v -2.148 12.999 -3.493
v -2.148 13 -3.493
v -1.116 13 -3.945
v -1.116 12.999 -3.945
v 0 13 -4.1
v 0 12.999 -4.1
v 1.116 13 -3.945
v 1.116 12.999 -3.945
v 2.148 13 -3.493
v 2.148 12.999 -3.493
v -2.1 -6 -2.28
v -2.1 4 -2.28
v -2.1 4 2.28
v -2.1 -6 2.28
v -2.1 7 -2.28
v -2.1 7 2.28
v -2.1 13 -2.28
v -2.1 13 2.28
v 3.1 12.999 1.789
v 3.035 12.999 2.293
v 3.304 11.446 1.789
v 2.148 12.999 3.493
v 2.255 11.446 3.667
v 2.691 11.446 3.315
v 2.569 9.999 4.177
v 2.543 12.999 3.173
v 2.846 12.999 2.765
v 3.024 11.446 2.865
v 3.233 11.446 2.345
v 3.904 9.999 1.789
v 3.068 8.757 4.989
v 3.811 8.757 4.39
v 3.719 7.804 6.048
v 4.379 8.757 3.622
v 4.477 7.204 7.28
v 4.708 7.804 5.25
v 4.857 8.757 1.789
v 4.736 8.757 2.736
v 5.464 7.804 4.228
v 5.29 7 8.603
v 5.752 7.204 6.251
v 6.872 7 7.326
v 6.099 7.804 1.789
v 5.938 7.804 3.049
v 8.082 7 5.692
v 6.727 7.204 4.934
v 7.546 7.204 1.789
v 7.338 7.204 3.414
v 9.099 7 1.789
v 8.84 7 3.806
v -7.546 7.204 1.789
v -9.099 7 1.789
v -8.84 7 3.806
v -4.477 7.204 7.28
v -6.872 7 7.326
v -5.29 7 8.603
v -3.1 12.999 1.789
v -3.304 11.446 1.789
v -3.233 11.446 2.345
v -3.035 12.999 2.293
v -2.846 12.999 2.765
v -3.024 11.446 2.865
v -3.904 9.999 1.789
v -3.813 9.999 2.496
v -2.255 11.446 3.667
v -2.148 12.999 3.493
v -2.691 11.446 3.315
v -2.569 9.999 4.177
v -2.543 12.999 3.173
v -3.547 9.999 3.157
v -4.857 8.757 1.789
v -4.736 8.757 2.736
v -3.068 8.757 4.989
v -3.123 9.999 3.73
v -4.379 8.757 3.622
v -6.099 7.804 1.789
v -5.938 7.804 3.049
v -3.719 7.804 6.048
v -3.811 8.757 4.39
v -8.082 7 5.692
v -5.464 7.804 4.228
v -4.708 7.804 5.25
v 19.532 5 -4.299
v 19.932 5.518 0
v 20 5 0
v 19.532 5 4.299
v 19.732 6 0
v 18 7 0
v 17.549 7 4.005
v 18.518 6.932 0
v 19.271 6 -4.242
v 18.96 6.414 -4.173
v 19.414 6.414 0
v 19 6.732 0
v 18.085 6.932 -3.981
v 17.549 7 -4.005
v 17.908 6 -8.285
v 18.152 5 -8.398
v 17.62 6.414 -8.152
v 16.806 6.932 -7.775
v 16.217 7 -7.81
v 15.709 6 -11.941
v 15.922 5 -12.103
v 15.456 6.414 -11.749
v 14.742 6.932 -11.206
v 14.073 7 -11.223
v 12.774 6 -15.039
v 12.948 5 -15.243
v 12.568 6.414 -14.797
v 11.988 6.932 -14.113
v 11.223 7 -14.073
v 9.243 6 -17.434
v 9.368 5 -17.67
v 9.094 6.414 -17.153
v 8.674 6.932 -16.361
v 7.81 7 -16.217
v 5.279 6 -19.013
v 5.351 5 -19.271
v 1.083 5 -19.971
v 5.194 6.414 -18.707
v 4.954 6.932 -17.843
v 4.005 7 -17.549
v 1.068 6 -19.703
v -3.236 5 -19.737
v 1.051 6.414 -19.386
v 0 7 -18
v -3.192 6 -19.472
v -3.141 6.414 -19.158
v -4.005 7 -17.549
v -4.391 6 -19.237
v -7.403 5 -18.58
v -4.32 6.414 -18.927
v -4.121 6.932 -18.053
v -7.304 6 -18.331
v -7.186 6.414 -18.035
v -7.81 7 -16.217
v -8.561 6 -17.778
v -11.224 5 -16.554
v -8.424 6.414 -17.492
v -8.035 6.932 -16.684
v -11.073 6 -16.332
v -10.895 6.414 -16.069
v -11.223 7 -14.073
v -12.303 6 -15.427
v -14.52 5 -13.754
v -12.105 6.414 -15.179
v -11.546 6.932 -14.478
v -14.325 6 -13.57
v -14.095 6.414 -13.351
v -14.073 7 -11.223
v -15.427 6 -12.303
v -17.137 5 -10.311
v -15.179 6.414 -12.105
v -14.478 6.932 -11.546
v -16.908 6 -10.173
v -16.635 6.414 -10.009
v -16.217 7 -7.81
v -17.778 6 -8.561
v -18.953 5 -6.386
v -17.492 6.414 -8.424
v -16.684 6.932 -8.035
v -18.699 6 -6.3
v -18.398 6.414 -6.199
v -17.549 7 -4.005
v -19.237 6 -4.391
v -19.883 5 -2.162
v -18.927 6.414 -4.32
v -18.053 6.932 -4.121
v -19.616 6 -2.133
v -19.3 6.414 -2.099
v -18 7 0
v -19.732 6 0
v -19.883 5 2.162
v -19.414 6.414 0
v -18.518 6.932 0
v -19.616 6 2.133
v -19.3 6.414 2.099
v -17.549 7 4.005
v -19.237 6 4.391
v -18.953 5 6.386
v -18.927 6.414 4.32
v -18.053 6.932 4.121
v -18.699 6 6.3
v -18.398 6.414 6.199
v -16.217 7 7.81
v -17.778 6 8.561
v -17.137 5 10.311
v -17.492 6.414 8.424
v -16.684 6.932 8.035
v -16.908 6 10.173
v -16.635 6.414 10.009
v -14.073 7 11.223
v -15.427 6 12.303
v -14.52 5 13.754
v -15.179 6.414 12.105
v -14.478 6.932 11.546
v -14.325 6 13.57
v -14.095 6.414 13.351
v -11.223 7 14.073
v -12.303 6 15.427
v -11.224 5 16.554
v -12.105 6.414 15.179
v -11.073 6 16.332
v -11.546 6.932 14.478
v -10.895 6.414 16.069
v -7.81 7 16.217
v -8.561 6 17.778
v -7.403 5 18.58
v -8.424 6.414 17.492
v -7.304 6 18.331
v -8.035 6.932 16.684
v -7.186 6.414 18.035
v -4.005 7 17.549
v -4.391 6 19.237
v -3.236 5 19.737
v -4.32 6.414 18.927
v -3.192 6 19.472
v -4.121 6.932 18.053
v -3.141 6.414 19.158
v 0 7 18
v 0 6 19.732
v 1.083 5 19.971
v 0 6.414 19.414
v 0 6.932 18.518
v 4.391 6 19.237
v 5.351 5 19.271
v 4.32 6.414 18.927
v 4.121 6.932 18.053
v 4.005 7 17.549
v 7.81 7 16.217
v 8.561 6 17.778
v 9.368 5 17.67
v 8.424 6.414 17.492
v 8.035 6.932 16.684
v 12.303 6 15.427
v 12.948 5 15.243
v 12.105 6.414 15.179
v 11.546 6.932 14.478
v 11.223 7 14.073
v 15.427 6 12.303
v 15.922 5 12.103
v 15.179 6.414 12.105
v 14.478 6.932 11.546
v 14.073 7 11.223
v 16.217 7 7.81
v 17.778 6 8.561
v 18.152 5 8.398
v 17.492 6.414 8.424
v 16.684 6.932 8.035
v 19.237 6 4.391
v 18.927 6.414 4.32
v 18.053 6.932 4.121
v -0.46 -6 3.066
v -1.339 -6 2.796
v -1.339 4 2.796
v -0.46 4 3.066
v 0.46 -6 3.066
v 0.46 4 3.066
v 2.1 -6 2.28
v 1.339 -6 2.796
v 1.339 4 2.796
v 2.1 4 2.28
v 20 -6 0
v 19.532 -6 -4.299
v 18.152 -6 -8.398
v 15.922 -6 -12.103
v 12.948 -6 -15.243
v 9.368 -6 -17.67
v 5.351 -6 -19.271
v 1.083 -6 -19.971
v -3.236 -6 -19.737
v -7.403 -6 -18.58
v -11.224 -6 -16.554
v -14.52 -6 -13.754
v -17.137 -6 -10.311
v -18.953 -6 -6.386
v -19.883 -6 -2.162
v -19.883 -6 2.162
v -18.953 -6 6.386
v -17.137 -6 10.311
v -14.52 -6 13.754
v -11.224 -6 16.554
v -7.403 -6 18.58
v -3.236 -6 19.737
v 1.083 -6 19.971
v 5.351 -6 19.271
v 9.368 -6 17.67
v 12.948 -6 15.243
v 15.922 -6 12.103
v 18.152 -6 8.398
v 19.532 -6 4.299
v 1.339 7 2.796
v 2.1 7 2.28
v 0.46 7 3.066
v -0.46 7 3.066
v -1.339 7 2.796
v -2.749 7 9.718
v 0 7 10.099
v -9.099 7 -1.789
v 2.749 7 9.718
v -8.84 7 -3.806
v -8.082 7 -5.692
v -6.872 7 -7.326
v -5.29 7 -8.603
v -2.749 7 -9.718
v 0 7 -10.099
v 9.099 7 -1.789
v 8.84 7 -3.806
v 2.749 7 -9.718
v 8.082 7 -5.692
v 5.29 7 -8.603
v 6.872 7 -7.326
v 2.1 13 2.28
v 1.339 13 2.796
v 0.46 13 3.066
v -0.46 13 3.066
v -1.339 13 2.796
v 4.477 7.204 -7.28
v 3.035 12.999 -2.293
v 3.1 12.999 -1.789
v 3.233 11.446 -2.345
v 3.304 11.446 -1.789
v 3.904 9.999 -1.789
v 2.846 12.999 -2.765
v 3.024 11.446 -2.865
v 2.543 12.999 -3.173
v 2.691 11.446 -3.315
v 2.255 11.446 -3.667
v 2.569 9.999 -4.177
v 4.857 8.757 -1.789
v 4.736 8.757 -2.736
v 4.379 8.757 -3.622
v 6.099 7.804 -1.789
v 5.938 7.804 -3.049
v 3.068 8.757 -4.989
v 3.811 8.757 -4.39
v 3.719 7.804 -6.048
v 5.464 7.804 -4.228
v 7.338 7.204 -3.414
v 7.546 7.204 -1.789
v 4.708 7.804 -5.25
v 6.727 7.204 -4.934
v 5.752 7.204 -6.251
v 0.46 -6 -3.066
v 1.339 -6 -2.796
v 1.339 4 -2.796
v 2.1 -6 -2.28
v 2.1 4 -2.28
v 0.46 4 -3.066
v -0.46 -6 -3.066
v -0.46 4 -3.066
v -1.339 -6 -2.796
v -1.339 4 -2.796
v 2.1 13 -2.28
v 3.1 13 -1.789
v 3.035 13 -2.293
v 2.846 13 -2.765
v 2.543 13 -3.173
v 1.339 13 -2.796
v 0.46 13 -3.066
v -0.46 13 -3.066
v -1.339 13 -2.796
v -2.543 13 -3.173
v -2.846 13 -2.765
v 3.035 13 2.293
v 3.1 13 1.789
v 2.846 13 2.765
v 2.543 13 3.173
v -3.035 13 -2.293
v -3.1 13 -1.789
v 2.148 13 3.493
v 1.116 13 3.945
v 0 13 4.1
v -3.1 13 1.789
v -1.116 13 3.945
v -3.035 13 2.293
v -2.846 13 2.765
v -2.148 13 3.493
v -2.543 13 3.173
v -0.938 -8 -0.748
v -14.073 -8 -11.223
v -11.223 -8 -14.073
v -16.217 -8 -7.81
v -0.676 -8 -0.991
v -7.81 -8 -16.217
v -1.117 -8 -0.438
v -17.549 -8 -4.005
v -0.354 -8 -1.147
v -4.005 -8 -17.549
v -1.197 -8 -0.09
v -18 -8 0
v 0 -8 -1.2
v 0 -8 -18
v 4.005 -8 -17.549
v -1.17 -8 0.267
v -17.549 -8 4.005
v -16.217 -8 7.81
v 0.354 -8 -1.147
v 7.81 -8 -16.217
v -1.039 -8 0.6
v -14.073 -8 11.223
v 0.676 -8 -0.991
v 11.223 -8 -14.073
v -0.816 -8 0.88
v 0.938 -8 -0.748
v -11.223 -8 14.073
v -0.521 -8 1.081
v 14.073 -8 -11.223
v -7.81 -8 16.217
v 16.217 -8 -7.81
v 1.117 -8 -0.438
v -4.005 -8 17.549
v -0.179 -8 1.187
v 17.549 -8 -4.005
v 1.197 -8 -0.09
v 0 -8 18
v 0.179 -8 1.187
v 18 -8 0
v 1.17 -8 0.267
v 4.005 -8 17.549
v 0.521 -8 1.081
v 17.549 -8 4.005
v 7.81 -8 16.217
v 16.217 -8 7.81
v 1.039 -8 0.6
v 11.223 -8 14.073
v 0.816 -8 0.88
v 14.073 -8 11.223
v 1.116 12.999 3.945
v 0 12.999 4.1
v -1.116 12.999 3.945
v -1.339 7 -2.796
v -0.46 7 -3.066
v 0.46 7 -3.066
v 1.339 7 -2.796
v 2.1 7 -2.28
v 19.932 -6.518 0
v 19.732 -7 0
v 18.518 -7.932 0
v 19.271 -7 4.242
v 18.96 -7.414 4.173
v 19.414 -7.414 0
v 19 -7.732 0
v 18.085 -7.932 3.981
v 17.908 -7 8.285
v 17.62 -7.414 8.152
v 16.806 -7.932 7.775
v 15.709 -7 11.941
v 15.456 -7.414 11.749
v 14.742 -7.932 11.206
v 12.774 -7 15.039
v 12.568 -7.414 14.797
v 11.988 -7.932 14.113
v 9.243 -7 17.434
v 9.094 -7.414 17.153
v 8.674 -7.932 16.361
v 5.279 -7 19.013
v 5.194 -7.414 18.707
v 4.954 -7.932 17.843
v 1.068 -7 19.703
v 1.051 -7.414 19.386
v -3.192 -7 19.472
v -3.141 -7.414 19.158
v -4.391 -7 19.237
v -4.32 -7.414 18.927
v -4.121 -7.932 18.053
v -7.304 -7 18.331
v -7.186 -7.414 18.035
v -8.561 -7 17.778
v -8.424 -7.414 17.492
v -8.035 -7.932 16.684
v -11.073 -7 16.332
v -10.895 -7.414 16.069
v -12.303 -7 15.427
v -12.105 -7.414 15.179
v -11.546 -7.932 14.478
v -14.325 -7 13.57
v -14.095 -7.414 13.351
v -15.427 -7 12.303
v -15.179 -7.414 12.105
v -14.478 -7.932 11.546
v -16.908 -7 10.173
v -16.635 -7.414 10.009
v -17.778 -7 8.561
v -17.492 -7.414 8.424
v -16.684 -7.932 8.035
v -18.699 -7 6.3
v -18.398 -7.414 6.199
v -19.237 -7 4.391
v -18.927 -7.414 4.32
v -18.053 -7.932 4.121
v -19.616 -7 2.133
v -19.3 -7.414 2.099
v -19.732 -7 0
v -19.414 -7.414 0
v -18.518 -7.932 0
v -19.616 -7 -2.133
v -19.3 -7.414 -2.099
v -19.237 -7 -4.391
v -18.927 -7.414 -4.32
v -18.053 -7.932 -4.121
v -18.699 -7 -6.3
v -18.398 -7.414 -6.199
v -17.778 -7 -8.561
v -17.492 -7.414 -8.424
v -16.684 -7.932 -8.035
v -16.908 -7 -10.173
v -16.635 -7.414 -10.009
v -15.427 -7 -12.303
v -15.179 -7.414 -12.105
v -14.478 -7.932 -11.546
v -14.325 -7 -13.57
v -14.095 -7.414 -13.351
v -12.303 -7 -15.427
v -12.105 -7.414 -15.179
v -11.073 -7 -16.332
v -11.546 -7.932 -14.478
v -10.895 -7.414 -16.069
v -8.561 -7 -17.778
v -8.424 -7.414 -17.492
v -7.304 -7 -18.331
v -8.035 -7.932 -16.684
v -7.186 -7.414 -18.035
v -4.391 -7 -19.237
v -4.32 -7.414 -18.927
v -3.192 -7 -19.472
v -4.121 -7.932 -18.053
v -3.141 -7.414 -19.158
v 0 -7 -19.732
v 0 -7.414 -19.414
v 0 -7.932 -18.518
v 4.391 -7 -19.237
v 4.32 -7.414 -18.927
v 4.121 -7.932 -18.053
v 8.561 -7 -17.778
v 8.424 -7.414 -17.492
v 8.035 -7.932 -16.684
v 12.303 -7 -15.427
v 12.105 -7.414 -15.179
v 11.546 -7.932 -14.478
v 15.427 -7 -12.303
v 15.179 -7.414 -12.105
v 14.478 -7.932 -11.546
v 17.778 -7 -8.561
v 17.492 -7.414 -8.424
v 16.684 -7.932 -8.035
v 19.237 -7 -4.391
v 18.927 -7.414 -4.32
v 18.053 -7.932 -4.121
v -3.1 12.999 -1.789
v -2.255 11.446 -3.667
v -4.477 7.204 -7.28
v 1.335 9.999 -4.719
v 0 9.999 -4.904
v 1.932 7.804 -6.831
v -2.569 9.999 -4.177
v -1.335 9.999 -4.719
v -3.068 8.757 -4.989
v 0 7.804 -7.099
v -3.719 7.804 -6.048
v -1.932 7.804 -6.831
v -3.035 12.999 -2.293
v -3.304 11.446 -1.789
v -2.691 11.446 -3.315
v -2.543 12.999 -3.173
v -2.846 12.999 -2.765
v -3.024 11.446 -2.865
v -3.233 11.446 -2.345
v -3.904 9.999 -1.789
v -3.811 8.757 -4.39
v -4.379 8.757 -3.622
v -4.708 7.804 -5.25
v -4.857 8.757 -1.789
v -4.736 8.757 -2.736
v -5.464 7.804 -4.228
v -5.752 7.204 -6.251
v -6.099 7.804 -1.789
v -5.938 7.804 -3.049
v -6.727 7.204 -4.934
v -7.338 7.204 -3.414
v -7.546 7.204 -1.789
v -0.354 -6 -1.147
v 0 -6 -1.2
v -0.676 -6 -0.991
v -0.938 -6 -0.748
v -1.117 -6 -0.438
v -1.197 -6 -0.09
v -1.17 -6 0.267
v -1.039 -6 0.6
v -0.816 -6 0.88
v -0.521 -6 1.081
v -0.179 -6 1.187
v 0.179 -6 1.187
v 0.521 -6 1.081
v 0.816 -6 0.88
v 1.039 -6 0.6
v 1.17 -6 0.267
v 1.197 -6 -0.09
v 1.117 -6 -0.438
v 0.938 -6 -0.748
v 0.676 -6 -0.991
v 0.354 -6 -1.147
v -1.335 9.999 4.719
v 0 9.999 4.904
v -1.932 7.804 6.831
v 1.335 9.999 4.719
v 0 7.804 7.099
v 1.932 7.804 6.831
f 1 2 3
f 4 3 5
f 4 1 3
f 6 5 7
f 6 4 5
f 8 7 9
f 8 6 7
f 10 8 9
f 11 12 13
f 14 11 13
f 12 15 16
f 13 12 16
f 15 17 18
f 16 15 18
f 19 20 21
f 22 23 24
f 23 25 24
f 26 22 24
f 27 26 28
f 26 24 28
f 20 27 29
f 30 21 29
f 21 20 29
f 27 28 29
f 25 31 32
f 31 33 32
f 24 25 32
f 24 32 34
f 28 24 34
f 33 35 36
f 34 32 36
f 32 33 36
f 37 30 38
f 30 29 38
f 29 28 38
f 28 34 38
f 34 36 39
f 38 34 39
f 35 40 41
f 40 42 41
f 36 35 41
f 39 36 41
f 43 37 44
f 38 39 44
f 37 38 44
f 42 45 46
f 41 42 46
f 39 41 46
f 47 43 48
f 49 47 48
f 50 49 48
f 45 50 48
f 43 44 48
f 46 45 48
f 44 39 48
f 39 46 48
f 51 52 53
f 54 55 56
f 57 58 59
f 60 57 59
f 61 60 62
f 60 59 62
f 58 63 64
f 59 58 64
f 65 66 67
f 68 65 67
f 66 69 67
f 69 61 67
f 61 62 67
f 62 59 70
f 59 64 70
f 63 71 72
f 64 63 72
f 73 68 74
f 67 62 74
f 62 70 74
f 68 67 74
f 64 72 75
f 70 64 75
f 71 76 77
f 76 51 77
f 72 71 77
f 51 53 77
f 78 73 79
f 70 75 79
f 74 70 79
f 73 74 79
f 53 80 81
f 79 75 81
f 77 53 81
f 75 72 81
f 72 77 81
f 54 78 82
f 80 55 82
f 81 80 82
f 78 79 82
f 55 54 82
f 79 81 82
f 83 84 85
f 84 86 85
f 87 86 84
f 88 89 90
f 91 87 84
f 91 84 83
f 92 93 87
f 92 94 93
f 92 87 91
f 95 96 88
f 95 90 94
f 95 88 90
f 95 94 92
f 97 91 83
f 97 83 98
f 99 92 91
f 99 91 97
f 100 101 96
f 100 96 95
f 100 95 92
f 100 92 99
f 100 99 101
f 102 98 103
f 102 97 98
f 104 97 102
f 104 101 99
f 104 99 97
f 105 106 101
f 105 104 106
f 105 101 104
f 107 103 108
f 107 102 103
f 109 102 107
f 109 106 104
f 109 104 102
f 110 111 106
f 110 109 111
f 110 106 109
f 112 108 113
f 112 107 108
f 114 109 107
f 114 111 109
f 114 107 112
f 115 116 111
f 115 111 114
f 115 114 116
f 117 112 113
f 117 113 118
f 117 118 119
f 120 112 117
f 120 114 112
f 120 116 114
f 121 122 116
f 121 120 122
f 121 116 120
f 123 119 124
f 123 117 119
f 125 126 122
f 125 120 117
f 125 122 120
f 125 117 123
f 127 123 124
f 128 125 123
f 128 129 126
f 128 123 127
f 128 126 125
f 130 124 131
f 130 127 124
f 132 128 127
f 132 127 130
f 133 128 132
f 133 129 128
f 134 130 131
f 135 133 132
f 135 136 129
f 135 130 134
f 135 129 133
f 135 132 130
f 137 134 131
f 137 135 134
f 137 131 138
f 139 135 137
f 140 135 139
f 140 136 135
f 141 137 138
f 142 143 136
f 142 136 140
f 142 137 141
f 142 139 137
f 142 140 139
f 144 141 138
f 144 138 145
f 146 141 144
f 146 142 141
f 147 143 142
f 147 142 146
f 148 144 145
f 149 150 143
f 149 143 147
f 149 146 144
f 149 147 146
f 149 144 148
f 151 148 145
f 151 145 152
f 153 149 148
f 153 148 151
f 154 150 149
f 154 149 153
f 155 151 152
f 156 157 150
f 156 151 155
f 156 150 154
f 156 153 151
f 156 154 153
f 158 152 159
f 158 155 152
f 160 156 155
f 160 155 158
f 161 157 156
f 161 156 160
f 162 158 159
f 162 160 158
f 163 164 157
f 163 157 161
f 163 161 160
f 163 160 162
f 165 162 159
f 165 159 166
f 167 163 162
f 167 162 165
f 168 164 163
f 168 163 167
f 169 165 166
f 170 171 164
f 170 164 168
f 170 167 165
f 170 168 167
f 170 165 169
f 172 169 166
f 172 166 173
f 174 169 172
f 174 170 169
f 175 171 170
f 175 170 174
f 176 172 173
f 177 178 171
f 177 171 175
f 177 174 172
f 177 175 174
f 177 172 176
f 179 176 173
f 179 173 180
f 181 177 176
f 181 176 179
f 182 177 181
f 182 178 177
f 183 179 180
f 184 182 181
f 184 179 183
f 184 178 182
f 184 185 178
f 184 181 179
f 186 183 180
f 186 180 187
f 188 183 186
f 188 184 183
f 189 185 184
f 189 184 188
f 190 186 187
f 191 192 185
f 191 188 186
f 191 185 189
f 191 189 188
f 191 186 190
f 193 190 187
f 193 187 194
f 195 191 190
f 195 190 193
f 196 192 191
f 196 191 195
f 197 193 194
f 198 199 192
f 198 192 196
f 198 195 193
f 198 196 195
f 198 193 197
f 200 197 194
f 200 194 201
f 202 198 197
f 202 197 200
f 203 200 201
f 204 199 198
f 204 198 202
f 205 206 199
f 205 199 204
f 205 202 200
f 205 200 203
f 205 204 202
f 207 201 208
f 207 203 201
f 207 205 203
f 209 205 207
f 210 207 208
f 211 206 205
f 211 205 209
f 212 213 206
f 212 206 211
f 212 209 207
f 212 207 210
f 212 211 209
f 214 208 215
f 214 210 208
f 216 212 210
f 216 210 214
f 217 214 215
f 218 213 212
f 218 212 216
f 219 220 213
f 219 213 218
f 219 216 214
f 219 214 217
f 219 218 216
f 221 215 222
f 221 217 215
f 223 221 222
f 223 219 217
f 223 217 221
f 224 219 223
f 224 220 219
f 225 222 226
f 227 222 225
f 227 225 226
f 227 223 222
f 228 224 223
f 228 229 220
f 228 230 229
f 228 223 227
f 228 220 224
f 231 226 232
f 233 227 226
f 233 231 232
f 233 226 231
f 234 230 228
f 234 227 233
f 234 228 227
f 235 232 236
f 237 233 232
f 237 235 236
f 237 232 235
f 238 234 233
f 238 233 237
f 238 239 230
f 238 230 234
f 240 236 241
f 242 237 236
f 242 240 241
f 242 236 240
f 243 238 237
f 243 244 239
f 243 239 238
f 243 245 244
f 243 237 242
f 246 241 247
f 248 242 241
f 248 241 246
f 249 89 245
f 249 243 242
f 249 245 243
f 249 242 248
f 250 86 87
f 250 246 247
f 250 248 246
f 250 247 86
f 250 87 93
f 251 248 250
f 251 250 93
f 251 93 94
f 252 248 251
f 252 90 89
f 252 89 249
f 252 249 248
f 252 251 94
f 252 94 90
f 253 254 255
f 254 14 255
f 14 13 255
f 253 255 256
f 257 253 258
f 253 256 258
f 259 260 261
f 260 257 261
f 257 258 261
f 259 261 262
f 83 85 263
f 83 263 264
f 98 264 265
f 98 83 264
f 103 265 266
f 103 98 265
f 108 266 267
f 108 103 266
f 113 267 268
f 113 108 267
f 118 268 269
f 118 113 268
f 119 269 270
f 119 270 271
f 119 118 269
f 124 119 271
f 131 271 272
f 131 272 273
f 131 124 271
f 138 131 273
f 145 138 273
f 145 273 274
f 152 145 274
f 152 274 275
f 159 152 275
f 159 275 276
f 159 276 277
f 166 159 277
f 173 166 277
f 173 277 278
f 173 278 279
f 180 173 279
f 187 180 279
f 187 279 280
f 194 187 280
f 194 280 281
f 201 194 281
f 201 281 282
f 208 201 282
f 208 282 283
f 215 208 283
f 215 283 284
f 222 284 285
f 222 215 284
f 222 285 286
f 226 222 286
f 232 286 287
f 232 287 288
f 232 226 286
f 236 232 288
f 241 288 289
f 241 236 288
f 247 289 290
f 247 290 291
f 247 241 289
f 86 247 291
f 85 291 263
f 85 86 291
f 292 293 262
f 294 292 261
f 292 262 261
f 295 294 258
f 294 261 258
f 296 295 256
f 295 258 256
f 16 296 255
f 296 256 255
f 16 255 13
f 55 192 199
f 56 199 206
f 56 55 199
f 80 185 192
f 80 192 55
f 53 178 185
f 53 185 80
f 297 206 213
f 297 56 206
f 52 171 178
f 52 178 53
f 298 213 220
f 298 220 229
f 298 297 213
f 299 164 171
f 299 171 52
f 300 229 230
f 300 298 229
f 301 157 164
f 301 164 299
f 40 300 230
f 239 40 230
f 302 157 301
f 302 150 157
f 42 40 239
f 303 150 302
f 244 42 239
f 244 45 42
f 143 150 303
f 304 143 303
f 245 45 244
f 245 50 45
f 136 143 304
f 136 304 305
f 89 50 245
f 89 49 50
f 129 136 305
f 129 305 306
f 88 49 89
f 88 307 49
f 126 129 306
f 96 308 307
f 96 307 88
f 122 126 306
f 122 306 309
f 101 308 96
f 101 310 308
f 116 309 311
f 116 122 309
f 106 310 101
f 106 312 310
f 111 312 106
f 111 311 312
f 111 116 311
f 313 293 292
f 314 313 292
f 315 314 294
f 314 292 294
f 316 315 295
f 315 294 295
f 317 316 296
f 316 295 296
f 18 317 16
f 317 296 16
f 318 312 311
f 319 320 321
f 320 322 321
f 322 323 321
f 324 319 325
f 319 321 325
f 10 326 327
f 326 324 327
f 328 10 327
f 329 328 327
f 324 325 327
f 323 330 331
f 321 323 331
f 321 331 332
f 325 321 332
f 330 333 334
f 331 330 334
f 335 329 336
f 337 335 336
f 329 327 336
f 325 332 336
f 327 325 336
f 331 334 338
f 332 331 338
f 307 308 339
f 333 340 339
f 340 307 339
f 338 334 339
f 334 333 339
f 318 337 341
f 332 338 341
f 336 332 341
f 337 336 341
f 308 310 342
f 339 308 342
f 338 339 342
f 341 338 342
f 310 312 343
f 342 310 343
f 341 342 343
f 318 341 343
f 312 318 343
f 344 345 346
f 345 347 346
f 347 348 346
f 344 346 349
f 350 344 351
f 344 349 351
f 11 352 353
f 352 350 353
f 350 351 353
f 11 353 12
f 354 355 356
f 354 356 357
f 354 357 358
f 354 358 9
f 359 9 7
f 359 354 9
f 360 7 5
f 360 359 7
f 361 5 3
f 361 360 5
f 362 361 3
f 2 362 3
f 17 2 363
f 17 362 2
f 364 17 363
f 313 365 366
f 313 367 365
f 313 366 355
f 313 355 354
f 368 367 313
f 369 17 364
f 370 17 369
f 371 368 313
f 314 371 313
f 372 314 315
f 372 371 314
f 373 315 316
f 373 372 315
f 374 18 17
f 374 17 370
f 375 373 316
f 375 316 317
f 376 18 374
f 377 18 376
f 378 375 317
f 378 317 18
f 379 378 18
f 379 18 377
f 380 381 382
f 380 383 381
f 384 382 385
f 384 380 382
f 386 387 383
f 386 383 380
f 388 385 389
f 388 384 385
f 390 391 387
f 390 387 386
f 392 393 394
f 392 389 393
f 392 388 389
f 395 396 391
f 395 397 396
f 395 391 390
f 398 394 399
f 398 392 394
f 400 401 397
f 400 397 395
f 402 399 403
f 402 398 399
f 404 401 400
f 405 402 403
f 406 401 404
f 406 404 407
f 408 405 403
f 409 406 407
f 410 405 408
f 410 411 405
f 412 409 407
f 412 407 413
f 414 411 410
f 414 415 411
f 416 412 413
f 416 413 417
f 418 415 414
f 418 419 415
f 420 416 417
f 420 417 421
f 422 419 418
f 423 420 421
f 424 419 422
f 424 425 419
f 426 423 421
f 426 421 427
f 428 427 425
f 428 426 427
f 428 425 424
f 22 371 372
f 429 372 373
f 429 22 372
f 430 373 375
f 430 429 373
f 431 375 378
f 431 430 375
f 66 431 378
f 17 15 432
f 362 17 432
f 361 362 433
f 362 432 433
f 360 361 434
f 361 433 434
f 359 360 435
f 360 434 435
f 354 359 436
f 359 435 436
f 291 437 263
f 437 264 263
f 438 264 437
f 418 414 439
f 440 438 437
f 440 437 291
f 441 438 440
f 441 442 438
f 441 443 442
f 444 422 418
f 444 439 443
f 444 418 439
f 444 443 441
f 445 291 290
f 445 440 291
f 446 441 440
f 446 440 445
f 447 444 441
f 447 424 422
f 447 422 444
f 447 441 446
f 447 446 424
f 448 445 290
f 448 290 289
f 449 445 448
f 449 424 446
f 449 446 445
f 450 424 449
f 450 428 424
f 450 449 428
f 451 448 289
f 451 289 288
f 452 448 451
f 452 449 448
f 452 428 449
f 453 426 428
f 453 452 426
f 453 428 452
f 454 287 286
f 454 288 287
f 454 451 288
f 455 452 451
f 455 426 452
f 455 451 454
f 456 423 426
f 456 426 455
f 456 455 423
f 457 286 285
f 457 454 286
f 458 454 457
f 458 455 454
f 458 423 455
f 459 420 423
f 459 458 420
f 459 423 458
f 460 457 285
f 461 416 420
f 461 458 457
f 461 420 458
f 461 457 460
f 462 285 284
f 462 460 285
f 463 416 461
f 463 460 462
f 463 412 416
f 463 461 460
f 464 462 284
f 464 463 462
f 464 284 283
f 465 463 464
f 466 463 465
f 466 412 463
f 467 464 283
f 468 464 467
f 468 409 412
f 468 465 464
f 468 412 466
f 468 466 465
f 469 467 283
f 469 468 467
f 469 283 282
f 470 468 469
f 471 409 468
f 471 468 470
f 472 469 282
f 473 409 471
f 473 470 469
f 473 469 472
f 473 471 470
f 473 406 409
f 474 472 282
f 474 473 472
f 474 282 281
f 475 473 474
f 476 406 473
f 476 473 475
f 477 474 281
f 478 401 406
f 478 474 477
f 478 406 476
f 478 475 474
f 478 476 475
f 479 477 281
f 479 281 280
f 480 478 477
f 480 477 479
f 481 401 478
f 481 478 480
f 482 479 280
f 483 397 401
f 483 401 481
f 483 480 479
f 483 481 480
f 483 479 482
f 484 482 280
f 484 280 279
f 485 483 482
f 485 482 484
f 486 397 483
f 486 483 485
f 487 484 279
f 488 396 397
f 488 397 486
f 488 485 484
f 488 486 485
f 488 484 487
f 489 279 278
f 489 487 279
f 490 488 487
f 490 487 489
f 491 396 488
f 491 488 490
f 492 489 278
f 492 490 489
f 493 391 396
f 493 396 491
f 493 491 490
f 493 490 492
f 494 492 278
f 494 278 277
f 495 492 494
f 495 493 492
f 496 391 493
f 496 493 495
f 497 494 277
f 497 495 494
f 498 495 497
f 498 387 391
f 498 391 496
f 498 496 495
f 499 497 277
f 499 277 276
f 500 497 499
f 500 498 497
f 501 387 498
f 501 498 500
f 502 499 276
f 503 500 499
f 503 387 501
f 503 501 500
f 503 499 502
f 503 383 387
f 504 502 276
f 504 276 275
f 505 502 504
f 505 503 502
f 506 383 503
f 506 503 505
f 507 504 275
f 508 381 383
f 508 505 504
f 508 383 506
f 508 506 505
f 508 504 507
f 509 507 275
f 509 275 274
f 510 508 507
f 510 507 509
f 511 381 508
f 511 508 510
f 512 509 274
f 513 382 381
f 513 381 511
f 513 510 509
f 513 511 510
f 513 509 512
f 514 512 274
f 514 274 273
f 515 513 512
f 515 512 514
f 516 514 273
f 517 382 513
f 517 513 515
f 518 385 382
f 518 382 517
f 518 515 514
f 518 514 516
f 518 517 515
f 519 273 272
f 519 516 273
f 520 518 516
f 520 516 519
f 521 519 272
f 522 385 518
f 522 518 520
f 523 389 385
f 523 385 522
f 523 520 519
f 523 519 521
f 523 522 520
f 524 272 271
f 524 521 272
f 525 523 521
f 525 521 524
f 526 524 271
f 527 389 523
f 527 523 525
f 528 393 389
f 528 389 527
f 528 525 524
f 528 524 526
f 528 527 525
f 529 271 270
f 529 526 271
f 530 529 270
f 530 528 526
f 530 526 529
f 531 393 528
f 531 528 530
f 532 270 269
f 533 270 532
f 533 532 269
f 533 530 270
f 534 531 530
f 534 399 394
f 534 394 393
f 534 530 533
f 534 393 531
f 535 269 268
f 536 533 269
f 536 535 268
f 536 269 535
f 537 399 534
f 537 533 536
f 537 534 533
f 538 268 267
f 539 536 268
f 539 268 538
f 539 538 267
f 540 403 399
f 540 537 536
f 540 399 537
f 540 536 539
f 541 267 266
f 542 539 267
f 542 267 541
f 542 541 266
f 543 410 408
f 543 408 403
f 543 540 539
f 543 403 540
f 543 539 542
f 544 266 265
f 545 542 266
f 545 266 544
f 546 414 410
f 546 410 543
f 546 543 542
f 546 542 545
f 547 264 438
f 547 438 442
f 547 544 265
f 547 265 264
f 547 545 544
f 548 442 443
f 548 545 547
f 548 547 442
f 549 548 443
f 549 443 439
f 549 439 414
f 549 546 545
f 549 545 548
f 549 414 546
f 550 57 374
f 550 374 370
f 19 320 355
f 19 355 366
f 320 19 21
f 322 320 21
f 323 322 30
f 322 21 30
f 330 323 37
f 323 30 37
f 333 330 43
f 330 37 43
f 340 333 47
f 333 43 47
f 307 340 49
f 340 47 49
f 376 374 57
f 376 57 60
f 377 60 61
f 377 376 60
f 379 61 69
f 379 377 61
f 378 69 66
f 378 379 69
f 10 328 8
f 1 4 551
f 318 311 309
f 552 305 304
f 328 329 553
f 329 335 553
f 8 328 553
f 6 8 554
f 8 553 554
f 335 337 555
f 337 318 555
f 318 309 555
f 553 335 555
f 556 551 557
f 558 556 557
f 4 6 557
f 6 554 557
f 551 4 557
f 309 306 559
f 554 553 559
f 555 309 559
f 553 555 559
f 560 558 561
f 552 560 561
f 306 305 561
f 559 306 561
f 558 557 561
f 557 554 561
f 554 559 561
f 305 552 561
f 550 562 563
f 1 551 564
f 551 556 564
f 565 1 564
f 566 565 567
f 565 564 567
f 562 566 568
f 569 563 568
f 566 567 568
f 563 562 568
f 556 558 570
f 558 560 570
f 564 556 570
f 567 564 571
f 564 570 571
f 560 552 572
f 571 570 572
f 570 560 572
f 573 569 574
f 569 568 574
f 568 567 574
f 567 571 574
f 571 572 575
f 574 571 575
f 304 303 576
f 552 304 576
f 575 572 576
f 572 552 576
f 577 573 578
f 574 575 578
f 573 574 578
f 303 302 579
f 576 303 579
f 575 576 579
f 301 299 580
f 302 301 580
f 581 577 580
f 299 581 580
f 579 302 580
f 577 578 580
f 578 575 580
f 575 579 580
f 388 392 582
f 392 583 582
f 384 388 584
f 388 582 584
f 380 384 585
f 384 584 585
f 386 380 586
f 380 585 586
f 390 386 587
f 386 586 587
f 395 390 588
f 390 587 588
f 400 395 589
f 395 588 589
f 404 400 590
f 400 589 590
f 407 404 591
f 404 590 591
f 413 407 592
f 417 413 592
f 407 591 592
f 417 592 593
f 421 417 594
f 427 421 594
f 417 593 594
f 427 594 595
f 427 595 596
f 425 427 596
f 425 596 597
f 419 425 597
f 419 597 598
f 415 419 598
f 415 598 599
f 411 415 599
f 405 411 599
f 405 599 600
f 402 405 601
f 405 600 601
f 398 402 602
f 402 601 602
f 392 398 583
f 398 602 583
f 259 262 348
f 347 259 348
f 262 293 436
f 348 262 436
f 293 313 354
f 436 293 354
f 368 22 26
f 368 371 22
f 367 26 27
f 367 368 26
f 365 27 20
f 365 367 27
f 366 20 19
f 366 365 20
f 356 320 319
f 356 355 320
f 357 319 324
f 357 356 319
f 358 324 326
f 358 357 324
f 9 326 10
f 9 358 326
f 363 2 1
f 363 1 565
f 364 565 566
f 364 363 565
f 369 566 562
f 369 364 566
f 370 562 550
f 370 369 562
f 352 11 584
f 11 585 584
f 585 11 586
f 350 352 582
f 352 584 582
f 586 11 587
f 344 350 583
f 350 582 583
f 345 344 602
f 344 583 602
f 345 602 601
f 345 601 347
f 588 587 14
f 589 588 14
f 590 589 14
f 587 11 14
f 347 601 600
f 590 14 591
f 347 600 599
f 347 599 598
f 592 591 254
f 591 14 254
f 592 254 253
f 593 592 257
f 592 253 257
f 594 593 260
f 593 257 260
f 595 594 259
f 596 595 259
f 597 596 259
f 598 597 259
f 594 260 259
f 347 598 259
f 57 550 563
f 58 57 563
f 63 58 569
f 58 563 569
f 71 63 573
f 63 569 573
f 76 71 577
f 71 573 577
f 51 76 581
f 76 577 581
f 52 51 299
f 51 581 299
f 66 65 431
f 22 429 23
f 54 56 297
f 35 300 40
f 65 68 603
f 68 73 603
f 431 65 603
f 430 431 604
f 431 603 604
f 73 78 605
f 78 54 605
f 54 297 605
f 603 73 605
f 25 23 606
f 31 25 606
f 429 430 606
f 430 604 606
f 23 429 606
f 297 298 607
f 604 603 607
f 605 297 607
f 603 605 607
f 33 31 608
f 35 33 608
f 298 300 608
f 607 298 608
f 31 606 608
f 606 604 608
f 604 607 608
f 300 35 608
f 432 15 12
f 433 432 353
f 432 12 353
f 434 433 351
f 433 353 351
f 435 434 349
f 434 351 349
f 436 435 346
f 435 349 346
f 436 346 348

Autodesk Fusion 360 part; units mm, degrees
sketch "Esquisse1" plane through (0, 0, 0) normal (0, 1, 0) x (1, 0, 0)
  circle A0 centre (0, 0) radius 20
  circle A1 centre (0, 0) radius 3.1
  line L0 (-2.1, -2.2804) -> (-2.1, 2.2804)
  line L1 (2.1, -2.2804) -> (2.1, 2.2804)
  line L2 (0, 0) -> (0, -3.1) construction
  line L3 (0, 0) -> (0, 3.1) construction
  dimension "d1" = 40
  dimension "d4" = 6.2
  dimension "d5" = 4.2
extrude "Extrusion1" add sketch "Esquisse1" along normal blind 7 contours A0 | A1 L1 | A1 L0
sketch "Esquisse2" plane through (0, 0, 0) normal (0, -1, 0) x (1, 0, 0)
  arc A0 (2.1, 2.2804) -> (-2.1, 2.2804) centre (0, 0) ccw
  line L0 (2.1, 2.2804) -> (2.1, -2.2804)
  arc A1 (-2.1, -2.2804) -> (2.1, -2.2804) centre (0, 0) ccw
  line L1 (-2.1, -2.2804) -> (-2.1, 2.2804)
  circle A2 centre (0, 0) radius 20
extrude "Extrusion2" add sketch "Esquisse2" against normal blind 4 contours A0 L0 A1 L1
hole "Perçage1" at (0, 0, 0) direction (0, 1, 0) diameter 2.4 depth 23 tip angle 118
sketch "Esquisse3" plane through (0, 7, 0) normal (0, 1, 0) x (-1, 0, 0)
  arc A0 (2.1, 2.2804) -> (-2.1, 2.2804) centre (0, 0) ccw
  line L0 (2.1, 2.2804) -> (2.1, -2.2804)
  arc A1 (-2.1, -2.2804) -> (2.1, -2.2804) centre (0, 0) ccw
  line L1 (-2.1, -2.2804) -> (-2.1, 2.2804)
  circle A2 centre (0, 0) radius 20
  arc A3 (2.1, 2.2804) -> (-2.1, 2.2804) centre (0, 0) ccw
  line L2 (-2.1, 2.2804) -> (-2.1, -2.2804)
  arc A4 (-2.1, -2.2804) -> (2.1, -2.2804) centre (0, 0) ccw
  line L3 (2.1, -2.2804) -> (2.1, 2.2804)
  arc A5 (-3.1, -2.6833) -> (3.1, -2.6833) centre (0, 0) ccw
  line L4 (3.1, 2.6833) -> (3.1, -2.6833)
  arc A6 (3.1, 2.6833) -> (-3.1, 2.6833) centre (0, 0) ccw
  line L5 (-3.1, -2.6833) -> (-3.1, 2.6833)
  circle A7 centre (0, 0) radius 1.2
  dimension "d11" = -1
extrude "Extrusion3" add sketch "Esquisse3" along normal blind 6 contours A5 L4 A6 L5
fillet "Congé1" radius 2 4 edges at (3.1, 10, 2.6833) (3.1, 10, -2.6833) (-3.1, 10, 2.6833) (-3.1, 10, -2.6833)
fillet "Congé2" radius 6 8 edges at (3.1, 7, 0) (2.8457, 7, 2.7648) (0, 7, 4.1) (-2.8457, 7, 2.7648) (-3.1, 7, 0) (-2.8457, 7, -2.7648) (0, 7, -4.1) (2.8457, 7, -2.7648)
sketch "Esquisse4" plane through (0, 7, 0) normal (0, 1, 0) x (-1, 0, 0)
  circle A0 centre (0, 0) radius 20
  line L0 (-9.1, -1.7889) -> (-9.1, 1.7889)
  arc A1 (-5.2905, 8.6035) -> (-9.1, 1.7889) centre (-1.1, 1.7889) ccw
  arc A2 (5.2905, 8.6035) -> (-5.2905, 8.6035) centre (0, 0) ccw
  arc A3 (9.1, 1.7889) -> (5.2905, 8.6035) centre (1.1, 1.7889) ccw
  line L1 (9.1, 1.7889) -> (9.1, -1.7889)
  arc A4 (5.2905, -8.6035) -> (9.1, -1.7889) centre (1.1, -1.7889) ccw
  arc A5 (-5.2905, -8.6035) -> (5.2905, -8.6035) centre (0, 0) ccw
  arc A6 (-9.1, -1.7889) -> (-5.2905, -8.6035) centre (-1.1, -1.7889) ccw
  circle A7 centre (0, 0) radius 20
  circle A8 centre (0, 0) radius 10.25
  line L2 (0, 0) -> (0, 20) construction
  line L3 (0, 10.25) -> (0, 20) construction
  circle A9 centre (0, 0) radius 18
  line L4 (2.5, 12) -> (2.5, 16)
  arc A10 (2.5, 16) -> (-2.5, 16) centre (0, 16) ccw
  line L5 (-2.5, 16) -> (-2.5, 12)
  arc A11 (-2.5, 12) -> (2.5, 12) centre (0, 12) ccw
  line L6 (0, 12) -> (0, 16) construction
  arc A12 (-1.5, 12) -> (1.5, 12) centre (0, 12) ccw
  line L7 (1.5, 12) -> (1.5, 16)
  arc A13 (1.5, 16) -> (-1.5, 16) centre (0, 16) ccw
  line L8 (-1.5, 16) -> (-1.5, 12)
  line L9 (-15.9894, 2.5666) -> (-12.1852, 1.3306)
  line L10 (-15.6804, 3.5177) -> (-11.8762, 2.2816)
  arc A14 (-14.7534, 6.3709) -> (-15.6804, 3.5177) centre (-15.2169, 4.9443) ccw
  arc A15 (-14.4444, 7.3219) -> (-15.9894, 2.5666) centre (-15.2169, 4.9443) ccw
  line L11 (-10.6401, 6.0858) -> (-14.4444, 7.3219)
  line L12 (-10.9492, 5.1348) -> (-14.7534, 6.3709)
  arc A16 (-11.8762, 2.2816) -> (-10.9492, 5.1348) centre (-11.4127, 3.7082) ccw
  arc A17 (-12.1852, 1.3306) -> (-10.6401, 6.0858) centre (-11.4127, 3.7082) ccw
  line L13 (-7.382, -14.4137) -> (-5.0309, -11.1777)
  line L14 (-8.191, -13.8259) -> (-5.8399, -10.5899)
  arc A18 (-10.6181, -12.0626) -> (-8.191, -13.8259) centre (-9.4046, -12.9443) ccw
  arc A19 (-11.4271, -11.4748) -> (-7.382, -14.4137) centre (-9.4046, -12.9443) ccw
  line L15 (-9.076, -8.2387) -> (-11.4271, -11.4748)
  line L16 (-8.2669, -8.8265) -> (-10.6181, -12.0626)
  arc A20 (-5.8399, -10.5899) -> (-8.2669, -8.8265) centre (-7.0534, -9.7082) ccw
  arc A21 (-5.0309, -11.1777) -> (-9.076, -8.2387) centre (-7.0534, -9.7082) ccw
  line L17 (11.4271, -11.4748) -> (9.076, -8.2387)
  line L18 (10.6181, -12.0626) -> (8.2669, -8.8265)
  arc A22 (8.191, -13.8259) -> (10.6181, -12.0626) centre (9.4046, -12.9443) ccw
  arc A23 (7.382, -14.4137) -> (11.4271, -11.4748) centre (9.4046, -12.9443) ccw
  line L19 (5.0309, -11.1777) -> (7.382, -14.4137)
  line L20 (5.8399, -10.5899) -> (8.191, -13.8259)
  arc A24 (8.2669, -8.8265) -> (5.8399, -10.5899) centre (7.0534, -9.7082) ccw
  arc A25 (9.076, -8.2387) -> (5.0309, -11.1777) centre (7.0534, -9.7082) ccw
  line L21 (14.4444, 7.3219) -> (10.6401, 6.0858)
  line L22 (14.7534, 6.3709) -> (10.9492, 5.1348)
  arc A26 (15.6804, 3.5177) -> (14.7534, 6.3709) centre (15.2169, 4.9443) ccw
  arc A27 (15.9894, 2.5666) -> (14.4444, 7.3219) centre (15.2169, 4.9443) ccw
  line L23 (12.1852, 1.3306) -> (15.9894, 2.5666)
  line L24 (11.8762, 2.2816) -> (15.6804, 3.5177)
  arc A28 (10.9492, 5.1348) -> (11.8762, 2.2816) centre (11.4127, 3.7082) ccw
  arc A29 (10.6401, 6.0858) -> (12.1852, 1.3306) centre (11.4127, 3.7082) ccw
  dimension "d18" = 20.5
  dimension "d19" = -2
  dimension "d20" = 16
  dimension "d21" = 12
  dimension "d22" = 5
  dimension "d23" = -1
  dimension "d25" = 360
extrude "Extrusion5" add 1 faces at (13.6578, 0, 1.0235) along direction (0, -1, 0) blind 3
extrude "Extrusion6" add 1 faces at (13.6578, -3, 1.0235) along direction (0, -1, 0) blind 5
extrude "Extrusion7" cut 1 faces at (-1.7989, 4, 0.0299) along direction (0, -1, 0) blind 10
fillet "Congé4" radius 2 2 edges at (-18.6465, -8, -7.2323) (-18.6465, 7, 7.2323)
